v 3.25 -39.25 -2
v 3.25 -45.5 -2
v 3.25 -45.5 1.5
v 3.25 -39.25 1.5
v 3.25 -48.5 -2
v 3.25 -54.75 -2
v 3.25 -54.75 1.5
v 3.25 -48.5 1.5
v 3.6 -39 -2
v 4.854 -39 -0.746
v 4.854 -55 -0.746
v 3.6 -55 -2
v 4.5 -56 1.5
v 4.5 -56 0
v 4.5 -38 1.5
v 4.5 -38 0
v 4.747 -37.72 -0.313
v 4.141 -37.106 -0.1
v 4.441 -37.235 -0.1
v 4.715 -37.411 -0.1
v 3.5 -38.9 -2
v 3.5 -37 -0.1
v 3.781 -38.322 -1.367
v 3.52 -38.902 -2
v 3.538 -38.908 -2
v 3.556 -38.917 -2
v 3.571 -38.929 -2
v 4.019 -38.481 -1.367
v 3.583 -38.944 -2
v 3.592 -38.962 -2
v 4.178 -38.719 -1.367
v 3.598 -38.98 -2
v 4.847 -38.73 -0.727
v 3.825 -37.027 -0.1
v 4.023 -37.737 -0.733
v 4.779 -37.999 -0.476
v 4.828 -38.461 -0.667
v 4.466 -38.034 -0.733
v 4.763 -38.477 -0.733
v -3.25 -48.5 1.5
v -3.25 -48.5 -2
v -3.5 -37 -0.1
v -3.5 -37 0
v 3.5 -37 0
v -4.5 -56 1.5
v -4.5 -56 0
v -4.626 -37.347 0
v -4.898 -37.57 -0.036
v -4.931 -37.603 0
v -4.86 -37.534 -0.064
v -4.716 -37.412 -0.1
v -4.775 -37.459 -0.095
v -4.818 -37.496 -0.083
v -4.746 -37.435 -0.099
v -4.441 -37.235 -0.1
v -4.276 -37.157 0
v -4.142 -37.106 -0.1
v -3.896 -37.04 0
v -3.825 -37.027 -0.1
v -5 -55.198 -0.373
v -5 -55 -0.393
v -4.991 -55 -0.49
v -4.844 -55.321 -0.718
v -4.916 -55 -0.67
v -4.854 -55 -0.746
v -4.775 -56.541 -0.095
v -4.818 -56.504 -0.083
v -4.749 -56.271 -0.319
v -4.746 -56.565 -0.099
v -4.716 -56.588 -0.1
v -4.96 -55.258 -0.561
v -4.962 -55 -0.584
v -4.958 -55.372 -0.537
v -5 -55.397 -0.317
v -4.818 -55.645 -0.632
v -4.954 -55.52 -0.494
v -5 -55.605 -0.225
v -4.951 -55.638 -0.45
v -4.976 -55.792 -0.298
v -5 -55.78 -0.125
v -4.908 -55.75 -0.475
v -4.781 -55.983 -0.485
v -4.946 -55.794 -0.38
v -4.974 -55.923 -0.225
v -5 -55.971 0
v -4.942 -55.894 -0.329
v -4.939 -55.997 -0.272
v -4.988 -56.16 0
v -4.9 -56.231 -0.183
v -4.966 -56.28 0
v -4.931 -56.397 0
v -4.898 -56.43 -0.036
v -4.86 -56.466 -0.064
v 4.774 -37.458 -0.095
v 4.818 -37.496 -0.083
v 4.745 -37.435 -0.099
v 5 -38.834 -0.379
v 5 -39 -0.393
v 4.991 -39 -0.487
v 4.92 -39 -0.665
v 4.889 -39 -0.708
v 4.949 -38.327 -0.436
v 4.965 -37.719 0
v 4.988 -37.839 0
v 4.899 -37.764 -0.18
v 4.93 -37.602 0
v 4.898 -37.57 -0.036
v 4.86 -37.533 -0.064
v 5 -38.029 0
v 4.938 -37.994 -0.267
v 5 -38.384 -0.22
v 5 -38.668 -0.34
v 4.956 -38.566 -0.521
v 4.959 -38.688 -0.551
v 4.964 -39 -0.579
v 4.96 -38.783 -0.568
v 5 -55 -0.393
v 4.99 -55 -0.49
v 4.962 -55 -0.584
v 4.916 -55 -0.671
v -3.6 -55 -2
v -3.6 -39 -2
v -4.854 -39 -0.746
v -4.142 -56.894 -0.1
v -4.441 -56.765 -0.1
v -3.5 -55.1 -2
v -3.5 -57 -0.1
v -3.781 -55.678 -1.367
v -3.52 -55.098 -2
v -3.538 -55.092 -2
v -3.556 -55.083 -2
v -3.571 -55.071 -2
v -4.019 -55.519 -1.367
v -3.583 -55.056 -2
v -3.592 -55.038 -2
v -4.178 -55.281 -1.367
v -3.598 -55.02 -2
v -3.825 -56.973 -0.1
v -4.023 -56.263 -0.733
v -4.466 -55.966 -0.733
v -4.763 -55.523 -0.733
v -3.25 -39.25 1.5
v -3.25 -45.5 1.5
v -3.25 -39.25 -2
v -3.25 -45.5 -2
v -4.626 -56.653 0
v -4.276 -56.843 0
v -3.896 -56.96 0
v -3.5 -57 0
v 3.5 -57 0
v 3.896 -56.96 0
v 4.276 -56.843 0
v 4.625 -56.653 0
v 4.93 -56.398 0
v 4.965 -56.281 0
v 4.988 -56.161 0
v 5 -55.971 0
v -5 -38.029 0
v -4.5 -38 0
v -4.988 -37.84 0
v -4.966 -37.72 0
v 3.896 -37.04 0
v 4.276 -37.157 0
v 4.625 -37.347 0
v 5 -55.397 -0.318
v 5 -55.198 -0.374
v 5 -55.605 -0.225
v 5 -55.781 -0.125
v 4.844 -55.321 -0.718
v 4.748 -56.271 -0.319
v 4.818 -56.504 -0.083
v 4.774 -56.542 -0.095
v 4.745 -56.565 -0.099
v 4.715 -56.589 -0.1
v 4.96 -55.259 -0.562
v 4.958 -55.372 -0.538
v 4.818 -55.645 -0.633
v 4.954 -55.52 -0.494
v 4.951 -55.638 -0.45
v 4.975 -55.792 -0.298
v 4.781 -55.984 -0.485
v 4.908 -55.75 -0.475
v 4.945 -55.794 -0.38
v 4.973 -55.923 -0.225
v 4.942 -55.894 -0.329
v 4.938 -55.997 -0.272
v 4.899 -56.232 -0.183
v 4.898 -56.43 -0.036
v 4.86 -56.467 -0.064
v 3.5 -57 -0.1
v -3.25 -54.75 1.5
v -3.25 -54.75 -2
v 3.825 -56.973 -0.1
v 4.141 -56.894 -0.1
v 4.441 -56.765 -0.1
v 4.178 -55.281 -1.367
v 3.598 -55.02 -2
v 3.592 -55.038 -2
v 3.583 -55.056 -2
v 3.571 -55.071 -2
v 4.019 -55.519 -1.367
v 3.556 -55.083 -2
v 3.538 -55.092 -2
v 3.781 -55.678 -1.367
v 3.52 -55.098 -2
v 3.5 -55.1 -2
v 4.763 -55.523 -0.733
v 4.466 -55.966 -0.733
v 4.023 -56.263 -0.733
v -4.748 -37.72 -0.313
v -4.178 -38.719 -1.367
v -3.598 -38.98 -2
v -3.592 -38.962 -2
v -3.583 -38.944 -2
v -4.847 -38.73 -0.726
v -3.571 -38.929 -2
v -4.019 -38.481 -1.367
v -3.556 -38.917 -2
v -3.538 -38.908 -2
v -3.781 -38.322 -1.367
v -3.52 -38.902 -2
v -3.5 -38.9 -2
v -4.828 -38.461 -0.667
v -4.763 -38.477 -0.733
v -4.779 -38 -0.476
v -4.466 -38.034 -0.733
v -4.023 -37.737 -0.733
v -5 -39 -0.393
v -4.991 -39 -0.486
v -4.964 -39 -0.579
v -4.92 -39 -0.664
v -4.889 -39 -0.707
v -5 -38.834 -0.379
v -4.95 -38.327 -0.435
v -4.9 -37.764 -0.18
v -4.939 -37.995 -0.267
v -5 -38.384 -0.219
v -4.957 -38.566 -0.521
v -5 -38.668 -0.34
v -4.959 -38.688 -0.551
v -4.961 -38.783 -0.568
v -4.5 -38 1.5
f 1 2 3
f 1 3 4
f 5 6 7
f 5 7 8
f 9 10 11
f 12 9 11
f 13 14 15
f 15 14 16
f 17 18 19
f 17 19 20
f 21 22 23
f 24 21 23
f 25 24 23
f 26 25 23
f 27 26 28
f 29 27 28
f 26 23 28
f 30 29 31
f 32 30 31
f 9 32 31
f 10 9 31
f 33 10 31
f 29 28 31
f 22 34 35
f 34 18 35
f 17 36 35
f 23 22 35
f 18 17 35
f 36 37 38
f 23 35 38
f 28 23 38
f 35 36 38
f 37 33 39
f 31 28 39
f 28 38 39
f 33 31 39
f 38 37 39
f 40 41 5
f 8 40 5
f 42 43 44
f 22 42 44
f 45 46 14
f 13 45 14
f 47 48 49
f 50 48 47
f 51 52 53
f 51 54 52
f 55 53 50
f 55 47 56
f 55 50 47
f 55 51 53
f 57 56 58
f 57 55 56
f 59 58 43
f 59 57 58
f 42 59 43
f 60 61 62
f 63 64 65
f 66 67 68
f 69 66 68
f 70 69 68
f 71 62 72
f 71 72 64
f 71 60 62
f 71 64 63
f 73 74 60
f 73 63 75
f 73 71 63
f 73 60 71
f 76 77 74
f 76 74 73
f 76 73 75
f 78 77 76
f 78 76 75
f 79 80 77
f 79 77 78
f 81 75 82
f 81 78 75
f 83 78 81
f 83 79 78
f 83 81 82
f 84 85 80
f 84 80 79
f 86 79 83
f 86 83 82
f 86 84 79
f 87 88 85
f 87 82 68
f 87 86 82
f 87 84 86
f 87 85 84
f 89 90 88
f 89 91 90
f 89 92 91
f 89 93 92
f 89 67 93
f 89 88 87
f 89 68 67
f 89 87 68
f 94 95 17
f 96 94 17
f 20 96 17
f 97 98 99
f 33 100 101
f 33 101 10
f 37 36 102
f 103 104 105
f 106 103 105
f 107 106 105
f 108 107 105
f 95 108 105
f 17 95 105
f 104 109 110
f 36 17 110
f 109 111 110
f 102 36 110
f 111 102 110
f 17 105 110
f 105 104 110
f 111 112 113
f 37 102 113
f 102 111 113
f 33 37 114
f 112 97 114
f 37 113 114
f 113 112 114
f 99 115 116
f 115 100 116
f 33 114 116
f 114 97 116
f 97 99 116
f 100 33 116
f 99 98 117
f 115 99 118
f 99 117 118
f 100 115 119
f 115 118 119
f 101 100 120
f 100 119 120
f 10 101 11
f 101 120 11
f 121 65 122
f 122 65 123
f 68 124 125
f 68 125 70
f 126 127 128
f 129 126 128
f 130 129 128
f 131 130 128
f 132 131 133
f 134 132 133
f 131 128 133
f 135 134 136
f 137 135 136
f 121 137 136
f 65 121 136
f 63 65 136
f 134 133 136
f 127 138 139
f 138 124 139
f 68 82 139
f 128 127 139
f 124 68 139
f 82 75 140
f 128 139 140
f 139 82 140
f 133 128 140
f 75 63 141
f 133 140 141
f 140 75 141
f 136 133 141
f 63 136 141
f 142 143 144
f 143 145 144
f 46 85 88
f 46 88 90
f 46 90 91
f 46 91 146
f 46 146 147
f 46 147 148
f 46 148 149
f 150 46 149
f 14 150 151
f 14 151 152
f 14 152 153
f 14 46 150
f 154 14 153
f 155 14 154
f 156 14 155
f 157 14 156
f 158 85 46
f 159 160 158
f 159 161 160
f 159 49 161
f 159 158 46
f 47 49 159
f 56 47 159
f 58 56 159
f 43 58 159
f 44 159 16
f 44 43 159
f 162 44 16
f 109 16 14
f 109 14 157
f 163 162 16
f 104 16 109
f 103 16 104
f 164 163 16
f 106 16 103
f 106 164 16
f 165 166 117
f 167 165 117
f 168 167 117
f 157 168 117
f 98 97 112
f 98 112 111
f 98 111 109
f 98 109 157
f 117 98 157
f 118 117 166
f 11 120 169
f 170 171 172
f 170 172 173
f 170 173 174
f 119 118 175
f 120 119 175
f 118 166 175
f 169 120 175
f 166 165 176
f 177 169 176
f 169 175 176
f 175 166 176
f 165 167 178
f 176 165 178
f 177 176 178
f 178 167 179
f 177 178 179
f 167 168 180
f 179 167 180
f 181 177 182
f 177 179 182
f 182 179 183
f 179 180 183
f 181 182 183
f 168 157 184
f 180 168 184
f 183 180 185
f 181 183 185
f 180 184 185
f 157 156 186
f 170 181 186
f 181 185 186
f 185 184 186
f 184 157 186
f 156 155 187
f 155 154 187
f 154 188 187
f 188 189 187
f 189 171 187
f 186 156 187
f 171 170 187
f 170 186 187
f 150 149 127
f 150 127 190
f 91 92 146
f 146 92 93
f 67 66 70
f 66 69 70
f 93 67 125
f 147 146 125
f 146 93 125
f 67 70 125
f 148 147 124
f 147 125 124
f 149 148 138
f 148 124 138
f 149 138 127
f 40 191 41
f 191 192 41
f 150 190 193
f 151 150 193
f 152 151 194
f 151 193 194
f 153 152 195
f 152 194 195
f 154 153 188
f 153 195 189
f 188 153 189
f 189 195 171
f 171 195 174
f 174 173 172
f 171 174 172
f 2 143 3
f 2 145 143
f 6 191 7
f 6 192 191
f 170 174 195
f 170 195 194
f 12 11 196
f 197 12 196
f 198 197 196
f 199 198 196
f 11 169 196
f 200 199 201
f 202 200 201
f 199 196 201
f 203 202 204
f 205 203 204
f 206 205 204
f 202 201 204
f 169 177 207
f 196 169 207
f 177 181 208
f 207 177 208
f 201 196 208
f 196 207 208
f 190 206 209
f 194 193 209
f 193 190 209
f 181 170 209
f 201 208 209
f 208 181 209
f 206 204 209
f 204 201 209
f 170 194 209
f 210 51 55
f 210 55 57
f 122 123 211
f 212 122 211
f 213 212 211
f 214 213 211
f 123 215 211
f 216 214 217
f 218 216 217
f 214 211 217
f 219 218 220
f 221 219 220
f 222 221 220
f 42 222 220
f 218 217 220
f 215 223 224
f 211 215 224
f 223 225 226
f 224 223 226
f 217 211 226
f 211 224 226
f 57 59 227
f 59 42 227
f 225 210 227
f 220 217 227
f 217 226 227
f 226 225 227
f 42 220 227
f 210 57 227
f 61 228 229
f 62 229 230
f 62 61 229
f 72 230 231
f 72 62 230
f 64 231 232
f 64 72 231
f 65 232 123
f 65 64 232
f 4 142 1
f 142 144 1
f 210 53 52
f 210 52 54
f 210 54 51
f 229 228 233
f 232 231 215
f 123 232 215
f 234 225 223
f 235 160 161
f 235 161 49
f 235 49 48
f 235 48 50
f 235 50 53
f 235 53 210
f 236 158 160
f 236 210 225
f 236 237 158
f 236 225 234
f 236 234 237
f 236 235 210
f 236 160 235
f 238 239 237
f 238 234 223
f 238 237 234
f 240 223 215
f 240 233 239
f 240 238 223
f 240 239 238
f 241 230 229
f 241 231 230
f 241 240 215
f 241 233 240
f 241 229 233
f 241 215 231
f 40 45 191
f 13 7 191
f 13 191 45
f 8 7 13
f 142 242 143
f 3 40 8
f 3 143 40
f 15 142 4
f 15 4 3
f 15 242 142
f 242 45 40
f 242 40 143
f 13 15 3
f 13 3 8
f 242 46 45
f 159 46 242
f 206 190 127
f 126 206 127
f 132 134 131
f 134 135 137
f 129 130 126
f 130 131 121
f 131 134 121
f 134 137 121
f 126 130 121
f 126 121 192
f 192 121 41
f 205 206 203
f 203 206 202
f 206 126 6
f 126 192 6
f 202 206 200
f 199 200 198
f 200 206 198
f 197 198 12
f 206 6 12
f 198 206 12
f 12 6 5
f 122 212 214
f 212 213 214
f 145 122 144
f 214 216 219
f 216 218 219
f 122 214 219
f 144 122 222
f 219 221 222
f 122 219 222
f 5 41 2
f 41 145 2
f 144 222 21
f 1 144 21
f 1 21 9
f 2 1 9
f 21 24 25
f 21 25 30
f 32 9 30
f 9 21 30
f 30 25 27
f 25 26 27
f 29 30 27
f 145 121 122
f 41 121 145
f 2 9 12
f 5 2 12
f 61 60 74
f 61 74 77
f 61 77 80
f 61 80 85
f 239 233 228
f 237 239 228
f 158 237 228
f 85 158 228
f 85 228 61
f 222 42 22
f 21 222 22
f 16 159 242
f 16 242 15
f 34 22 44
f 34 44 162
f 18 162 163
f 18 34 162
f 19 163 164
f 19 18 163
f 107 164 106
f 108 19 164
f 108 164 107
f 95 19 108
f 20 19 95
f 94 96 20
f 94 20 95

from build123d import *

# Parameters (mm, degrees)
SKETCH035_W     = 11
SKETCH035_H     = 20
PAD019_DEPTH    = 2
SKETCH036_W     = 6.5
SKETCH036_H     = 6.25
POCKET012_DEPTH = 5
FILLET007_R     = 2
CHAMFER_SIZE    = 1.9
SKETCH037_W     = 1.384659
SKETCH037_H     = 1.938071
SKETCH037_W_2   = 0.88585
SKETCH037_H_2   = 2.057402
POCKET013_DEPTH = 22
FILLET008_R     = 0.5
SKETCH045_W     = 9
SKETCH045_H     = 18
SKETCH045_W_2   = 6.5
SKETCH045_H_2   = 6.25
PAD021_DEPTH    = 1.5


with BuildPart() as part:
    # Sketch035 → Pad019 (new body)
    with BuildSketch(Plane.XY):
        with Locations((0, -47)):
            Rectangle(SKETCH035_W, SKETCH035_H)
    extrude(amount=-PAD019_DEPTH)

    # Sketch036 → Pocket012 (cut)
    with BuildSketch(Plane.XY):
        with Locations((0, -42.375)):
            Rectangle(SKETCH036_W, SKETCH036_H)
        with Locations((0, -51.625)):
            Rectangle(SKETCH036_W, SKETCH036_H)
    extrude(amount=-POCKET012_DEPTH, mode=Mode.SUBTRACT)

    # Fillet007
    fillet007_edges = [part.edges().sort_by_distance(p)[0] for p in [
        (-5.5, -37, -1),
        (5.5, -37, -1),
        (5.5, -57, -1),
        (-5.5, -57, -1),
    ]]
    fillet(fillet007_edges, radius=FILLET007_R)

    # Chamfer
    chamfer_edges = [part.edges().sort_by_distance(p)[0] for p in [
        (0, -37, -2),
        (-4.914214, -37.585786, -2),
        (4.914214, -37.585786, -2),
        (5.5, -47, -2),
        (4.914214, -56.414214, -2),
        (0, -57, -2),
        (-5.5, -47, -2),
        (-4.914214, -56.414214, -2),
    ]]
    chamfer(chamfer_edges, length=CHAMFER_SIZE)

    # Sketch037 → Pocket013 (cut)
    with BuildSketch(Plane.XZ.offset(36)):
        with Locations((5.692301, -0.969035)):
            Rectangle(SKETCH037_W, SKETCH037_H)
        with Locations((-5.443283, -1.028701)):
            Rectangle(SKETCH037_W_2, SKETCH037_H_2)
    extrude(amount=POCKET013_DEPTH, mode=Mode.SUBTRACT)

    # Fillet008
    fillet008_edges = [part.edges().sort_by_distance(p)[0] for p in [
        (4.999972, -47, -0.600028),
        (-5.000358, -47, -0.599642),
        (-5.000358, -55.695597, -0.446238),
        (4.999972, -55.695848, -0.446482),
        (-5.000358, -38.304403, -0.446238),
        (4.999972, -38.304152, -0.446482),
    ]]
    fillet(fillet008_edges, radius=FILLET008_R)

    # Sketch045 → Pad021 (join)
    with BuildSketch(Plane.XY):
        with Locations((0, -47)):
            Rectangle(SKETCH045_W, SKETCH045_H)
        with Locations((0, -42.375)):
            Rectangle(SKETCH045_W_2, SKETCH045_H_2, mode=Mode.SUBTRACT)
        with Locations((0, -51.625)):
            Rectangle(SKETCH045_W_2, SKETCH045_H_2, mode=Mode.SUBTRACT)
    extrude(amount=PAD021_DEPTH)


solid = part.part
